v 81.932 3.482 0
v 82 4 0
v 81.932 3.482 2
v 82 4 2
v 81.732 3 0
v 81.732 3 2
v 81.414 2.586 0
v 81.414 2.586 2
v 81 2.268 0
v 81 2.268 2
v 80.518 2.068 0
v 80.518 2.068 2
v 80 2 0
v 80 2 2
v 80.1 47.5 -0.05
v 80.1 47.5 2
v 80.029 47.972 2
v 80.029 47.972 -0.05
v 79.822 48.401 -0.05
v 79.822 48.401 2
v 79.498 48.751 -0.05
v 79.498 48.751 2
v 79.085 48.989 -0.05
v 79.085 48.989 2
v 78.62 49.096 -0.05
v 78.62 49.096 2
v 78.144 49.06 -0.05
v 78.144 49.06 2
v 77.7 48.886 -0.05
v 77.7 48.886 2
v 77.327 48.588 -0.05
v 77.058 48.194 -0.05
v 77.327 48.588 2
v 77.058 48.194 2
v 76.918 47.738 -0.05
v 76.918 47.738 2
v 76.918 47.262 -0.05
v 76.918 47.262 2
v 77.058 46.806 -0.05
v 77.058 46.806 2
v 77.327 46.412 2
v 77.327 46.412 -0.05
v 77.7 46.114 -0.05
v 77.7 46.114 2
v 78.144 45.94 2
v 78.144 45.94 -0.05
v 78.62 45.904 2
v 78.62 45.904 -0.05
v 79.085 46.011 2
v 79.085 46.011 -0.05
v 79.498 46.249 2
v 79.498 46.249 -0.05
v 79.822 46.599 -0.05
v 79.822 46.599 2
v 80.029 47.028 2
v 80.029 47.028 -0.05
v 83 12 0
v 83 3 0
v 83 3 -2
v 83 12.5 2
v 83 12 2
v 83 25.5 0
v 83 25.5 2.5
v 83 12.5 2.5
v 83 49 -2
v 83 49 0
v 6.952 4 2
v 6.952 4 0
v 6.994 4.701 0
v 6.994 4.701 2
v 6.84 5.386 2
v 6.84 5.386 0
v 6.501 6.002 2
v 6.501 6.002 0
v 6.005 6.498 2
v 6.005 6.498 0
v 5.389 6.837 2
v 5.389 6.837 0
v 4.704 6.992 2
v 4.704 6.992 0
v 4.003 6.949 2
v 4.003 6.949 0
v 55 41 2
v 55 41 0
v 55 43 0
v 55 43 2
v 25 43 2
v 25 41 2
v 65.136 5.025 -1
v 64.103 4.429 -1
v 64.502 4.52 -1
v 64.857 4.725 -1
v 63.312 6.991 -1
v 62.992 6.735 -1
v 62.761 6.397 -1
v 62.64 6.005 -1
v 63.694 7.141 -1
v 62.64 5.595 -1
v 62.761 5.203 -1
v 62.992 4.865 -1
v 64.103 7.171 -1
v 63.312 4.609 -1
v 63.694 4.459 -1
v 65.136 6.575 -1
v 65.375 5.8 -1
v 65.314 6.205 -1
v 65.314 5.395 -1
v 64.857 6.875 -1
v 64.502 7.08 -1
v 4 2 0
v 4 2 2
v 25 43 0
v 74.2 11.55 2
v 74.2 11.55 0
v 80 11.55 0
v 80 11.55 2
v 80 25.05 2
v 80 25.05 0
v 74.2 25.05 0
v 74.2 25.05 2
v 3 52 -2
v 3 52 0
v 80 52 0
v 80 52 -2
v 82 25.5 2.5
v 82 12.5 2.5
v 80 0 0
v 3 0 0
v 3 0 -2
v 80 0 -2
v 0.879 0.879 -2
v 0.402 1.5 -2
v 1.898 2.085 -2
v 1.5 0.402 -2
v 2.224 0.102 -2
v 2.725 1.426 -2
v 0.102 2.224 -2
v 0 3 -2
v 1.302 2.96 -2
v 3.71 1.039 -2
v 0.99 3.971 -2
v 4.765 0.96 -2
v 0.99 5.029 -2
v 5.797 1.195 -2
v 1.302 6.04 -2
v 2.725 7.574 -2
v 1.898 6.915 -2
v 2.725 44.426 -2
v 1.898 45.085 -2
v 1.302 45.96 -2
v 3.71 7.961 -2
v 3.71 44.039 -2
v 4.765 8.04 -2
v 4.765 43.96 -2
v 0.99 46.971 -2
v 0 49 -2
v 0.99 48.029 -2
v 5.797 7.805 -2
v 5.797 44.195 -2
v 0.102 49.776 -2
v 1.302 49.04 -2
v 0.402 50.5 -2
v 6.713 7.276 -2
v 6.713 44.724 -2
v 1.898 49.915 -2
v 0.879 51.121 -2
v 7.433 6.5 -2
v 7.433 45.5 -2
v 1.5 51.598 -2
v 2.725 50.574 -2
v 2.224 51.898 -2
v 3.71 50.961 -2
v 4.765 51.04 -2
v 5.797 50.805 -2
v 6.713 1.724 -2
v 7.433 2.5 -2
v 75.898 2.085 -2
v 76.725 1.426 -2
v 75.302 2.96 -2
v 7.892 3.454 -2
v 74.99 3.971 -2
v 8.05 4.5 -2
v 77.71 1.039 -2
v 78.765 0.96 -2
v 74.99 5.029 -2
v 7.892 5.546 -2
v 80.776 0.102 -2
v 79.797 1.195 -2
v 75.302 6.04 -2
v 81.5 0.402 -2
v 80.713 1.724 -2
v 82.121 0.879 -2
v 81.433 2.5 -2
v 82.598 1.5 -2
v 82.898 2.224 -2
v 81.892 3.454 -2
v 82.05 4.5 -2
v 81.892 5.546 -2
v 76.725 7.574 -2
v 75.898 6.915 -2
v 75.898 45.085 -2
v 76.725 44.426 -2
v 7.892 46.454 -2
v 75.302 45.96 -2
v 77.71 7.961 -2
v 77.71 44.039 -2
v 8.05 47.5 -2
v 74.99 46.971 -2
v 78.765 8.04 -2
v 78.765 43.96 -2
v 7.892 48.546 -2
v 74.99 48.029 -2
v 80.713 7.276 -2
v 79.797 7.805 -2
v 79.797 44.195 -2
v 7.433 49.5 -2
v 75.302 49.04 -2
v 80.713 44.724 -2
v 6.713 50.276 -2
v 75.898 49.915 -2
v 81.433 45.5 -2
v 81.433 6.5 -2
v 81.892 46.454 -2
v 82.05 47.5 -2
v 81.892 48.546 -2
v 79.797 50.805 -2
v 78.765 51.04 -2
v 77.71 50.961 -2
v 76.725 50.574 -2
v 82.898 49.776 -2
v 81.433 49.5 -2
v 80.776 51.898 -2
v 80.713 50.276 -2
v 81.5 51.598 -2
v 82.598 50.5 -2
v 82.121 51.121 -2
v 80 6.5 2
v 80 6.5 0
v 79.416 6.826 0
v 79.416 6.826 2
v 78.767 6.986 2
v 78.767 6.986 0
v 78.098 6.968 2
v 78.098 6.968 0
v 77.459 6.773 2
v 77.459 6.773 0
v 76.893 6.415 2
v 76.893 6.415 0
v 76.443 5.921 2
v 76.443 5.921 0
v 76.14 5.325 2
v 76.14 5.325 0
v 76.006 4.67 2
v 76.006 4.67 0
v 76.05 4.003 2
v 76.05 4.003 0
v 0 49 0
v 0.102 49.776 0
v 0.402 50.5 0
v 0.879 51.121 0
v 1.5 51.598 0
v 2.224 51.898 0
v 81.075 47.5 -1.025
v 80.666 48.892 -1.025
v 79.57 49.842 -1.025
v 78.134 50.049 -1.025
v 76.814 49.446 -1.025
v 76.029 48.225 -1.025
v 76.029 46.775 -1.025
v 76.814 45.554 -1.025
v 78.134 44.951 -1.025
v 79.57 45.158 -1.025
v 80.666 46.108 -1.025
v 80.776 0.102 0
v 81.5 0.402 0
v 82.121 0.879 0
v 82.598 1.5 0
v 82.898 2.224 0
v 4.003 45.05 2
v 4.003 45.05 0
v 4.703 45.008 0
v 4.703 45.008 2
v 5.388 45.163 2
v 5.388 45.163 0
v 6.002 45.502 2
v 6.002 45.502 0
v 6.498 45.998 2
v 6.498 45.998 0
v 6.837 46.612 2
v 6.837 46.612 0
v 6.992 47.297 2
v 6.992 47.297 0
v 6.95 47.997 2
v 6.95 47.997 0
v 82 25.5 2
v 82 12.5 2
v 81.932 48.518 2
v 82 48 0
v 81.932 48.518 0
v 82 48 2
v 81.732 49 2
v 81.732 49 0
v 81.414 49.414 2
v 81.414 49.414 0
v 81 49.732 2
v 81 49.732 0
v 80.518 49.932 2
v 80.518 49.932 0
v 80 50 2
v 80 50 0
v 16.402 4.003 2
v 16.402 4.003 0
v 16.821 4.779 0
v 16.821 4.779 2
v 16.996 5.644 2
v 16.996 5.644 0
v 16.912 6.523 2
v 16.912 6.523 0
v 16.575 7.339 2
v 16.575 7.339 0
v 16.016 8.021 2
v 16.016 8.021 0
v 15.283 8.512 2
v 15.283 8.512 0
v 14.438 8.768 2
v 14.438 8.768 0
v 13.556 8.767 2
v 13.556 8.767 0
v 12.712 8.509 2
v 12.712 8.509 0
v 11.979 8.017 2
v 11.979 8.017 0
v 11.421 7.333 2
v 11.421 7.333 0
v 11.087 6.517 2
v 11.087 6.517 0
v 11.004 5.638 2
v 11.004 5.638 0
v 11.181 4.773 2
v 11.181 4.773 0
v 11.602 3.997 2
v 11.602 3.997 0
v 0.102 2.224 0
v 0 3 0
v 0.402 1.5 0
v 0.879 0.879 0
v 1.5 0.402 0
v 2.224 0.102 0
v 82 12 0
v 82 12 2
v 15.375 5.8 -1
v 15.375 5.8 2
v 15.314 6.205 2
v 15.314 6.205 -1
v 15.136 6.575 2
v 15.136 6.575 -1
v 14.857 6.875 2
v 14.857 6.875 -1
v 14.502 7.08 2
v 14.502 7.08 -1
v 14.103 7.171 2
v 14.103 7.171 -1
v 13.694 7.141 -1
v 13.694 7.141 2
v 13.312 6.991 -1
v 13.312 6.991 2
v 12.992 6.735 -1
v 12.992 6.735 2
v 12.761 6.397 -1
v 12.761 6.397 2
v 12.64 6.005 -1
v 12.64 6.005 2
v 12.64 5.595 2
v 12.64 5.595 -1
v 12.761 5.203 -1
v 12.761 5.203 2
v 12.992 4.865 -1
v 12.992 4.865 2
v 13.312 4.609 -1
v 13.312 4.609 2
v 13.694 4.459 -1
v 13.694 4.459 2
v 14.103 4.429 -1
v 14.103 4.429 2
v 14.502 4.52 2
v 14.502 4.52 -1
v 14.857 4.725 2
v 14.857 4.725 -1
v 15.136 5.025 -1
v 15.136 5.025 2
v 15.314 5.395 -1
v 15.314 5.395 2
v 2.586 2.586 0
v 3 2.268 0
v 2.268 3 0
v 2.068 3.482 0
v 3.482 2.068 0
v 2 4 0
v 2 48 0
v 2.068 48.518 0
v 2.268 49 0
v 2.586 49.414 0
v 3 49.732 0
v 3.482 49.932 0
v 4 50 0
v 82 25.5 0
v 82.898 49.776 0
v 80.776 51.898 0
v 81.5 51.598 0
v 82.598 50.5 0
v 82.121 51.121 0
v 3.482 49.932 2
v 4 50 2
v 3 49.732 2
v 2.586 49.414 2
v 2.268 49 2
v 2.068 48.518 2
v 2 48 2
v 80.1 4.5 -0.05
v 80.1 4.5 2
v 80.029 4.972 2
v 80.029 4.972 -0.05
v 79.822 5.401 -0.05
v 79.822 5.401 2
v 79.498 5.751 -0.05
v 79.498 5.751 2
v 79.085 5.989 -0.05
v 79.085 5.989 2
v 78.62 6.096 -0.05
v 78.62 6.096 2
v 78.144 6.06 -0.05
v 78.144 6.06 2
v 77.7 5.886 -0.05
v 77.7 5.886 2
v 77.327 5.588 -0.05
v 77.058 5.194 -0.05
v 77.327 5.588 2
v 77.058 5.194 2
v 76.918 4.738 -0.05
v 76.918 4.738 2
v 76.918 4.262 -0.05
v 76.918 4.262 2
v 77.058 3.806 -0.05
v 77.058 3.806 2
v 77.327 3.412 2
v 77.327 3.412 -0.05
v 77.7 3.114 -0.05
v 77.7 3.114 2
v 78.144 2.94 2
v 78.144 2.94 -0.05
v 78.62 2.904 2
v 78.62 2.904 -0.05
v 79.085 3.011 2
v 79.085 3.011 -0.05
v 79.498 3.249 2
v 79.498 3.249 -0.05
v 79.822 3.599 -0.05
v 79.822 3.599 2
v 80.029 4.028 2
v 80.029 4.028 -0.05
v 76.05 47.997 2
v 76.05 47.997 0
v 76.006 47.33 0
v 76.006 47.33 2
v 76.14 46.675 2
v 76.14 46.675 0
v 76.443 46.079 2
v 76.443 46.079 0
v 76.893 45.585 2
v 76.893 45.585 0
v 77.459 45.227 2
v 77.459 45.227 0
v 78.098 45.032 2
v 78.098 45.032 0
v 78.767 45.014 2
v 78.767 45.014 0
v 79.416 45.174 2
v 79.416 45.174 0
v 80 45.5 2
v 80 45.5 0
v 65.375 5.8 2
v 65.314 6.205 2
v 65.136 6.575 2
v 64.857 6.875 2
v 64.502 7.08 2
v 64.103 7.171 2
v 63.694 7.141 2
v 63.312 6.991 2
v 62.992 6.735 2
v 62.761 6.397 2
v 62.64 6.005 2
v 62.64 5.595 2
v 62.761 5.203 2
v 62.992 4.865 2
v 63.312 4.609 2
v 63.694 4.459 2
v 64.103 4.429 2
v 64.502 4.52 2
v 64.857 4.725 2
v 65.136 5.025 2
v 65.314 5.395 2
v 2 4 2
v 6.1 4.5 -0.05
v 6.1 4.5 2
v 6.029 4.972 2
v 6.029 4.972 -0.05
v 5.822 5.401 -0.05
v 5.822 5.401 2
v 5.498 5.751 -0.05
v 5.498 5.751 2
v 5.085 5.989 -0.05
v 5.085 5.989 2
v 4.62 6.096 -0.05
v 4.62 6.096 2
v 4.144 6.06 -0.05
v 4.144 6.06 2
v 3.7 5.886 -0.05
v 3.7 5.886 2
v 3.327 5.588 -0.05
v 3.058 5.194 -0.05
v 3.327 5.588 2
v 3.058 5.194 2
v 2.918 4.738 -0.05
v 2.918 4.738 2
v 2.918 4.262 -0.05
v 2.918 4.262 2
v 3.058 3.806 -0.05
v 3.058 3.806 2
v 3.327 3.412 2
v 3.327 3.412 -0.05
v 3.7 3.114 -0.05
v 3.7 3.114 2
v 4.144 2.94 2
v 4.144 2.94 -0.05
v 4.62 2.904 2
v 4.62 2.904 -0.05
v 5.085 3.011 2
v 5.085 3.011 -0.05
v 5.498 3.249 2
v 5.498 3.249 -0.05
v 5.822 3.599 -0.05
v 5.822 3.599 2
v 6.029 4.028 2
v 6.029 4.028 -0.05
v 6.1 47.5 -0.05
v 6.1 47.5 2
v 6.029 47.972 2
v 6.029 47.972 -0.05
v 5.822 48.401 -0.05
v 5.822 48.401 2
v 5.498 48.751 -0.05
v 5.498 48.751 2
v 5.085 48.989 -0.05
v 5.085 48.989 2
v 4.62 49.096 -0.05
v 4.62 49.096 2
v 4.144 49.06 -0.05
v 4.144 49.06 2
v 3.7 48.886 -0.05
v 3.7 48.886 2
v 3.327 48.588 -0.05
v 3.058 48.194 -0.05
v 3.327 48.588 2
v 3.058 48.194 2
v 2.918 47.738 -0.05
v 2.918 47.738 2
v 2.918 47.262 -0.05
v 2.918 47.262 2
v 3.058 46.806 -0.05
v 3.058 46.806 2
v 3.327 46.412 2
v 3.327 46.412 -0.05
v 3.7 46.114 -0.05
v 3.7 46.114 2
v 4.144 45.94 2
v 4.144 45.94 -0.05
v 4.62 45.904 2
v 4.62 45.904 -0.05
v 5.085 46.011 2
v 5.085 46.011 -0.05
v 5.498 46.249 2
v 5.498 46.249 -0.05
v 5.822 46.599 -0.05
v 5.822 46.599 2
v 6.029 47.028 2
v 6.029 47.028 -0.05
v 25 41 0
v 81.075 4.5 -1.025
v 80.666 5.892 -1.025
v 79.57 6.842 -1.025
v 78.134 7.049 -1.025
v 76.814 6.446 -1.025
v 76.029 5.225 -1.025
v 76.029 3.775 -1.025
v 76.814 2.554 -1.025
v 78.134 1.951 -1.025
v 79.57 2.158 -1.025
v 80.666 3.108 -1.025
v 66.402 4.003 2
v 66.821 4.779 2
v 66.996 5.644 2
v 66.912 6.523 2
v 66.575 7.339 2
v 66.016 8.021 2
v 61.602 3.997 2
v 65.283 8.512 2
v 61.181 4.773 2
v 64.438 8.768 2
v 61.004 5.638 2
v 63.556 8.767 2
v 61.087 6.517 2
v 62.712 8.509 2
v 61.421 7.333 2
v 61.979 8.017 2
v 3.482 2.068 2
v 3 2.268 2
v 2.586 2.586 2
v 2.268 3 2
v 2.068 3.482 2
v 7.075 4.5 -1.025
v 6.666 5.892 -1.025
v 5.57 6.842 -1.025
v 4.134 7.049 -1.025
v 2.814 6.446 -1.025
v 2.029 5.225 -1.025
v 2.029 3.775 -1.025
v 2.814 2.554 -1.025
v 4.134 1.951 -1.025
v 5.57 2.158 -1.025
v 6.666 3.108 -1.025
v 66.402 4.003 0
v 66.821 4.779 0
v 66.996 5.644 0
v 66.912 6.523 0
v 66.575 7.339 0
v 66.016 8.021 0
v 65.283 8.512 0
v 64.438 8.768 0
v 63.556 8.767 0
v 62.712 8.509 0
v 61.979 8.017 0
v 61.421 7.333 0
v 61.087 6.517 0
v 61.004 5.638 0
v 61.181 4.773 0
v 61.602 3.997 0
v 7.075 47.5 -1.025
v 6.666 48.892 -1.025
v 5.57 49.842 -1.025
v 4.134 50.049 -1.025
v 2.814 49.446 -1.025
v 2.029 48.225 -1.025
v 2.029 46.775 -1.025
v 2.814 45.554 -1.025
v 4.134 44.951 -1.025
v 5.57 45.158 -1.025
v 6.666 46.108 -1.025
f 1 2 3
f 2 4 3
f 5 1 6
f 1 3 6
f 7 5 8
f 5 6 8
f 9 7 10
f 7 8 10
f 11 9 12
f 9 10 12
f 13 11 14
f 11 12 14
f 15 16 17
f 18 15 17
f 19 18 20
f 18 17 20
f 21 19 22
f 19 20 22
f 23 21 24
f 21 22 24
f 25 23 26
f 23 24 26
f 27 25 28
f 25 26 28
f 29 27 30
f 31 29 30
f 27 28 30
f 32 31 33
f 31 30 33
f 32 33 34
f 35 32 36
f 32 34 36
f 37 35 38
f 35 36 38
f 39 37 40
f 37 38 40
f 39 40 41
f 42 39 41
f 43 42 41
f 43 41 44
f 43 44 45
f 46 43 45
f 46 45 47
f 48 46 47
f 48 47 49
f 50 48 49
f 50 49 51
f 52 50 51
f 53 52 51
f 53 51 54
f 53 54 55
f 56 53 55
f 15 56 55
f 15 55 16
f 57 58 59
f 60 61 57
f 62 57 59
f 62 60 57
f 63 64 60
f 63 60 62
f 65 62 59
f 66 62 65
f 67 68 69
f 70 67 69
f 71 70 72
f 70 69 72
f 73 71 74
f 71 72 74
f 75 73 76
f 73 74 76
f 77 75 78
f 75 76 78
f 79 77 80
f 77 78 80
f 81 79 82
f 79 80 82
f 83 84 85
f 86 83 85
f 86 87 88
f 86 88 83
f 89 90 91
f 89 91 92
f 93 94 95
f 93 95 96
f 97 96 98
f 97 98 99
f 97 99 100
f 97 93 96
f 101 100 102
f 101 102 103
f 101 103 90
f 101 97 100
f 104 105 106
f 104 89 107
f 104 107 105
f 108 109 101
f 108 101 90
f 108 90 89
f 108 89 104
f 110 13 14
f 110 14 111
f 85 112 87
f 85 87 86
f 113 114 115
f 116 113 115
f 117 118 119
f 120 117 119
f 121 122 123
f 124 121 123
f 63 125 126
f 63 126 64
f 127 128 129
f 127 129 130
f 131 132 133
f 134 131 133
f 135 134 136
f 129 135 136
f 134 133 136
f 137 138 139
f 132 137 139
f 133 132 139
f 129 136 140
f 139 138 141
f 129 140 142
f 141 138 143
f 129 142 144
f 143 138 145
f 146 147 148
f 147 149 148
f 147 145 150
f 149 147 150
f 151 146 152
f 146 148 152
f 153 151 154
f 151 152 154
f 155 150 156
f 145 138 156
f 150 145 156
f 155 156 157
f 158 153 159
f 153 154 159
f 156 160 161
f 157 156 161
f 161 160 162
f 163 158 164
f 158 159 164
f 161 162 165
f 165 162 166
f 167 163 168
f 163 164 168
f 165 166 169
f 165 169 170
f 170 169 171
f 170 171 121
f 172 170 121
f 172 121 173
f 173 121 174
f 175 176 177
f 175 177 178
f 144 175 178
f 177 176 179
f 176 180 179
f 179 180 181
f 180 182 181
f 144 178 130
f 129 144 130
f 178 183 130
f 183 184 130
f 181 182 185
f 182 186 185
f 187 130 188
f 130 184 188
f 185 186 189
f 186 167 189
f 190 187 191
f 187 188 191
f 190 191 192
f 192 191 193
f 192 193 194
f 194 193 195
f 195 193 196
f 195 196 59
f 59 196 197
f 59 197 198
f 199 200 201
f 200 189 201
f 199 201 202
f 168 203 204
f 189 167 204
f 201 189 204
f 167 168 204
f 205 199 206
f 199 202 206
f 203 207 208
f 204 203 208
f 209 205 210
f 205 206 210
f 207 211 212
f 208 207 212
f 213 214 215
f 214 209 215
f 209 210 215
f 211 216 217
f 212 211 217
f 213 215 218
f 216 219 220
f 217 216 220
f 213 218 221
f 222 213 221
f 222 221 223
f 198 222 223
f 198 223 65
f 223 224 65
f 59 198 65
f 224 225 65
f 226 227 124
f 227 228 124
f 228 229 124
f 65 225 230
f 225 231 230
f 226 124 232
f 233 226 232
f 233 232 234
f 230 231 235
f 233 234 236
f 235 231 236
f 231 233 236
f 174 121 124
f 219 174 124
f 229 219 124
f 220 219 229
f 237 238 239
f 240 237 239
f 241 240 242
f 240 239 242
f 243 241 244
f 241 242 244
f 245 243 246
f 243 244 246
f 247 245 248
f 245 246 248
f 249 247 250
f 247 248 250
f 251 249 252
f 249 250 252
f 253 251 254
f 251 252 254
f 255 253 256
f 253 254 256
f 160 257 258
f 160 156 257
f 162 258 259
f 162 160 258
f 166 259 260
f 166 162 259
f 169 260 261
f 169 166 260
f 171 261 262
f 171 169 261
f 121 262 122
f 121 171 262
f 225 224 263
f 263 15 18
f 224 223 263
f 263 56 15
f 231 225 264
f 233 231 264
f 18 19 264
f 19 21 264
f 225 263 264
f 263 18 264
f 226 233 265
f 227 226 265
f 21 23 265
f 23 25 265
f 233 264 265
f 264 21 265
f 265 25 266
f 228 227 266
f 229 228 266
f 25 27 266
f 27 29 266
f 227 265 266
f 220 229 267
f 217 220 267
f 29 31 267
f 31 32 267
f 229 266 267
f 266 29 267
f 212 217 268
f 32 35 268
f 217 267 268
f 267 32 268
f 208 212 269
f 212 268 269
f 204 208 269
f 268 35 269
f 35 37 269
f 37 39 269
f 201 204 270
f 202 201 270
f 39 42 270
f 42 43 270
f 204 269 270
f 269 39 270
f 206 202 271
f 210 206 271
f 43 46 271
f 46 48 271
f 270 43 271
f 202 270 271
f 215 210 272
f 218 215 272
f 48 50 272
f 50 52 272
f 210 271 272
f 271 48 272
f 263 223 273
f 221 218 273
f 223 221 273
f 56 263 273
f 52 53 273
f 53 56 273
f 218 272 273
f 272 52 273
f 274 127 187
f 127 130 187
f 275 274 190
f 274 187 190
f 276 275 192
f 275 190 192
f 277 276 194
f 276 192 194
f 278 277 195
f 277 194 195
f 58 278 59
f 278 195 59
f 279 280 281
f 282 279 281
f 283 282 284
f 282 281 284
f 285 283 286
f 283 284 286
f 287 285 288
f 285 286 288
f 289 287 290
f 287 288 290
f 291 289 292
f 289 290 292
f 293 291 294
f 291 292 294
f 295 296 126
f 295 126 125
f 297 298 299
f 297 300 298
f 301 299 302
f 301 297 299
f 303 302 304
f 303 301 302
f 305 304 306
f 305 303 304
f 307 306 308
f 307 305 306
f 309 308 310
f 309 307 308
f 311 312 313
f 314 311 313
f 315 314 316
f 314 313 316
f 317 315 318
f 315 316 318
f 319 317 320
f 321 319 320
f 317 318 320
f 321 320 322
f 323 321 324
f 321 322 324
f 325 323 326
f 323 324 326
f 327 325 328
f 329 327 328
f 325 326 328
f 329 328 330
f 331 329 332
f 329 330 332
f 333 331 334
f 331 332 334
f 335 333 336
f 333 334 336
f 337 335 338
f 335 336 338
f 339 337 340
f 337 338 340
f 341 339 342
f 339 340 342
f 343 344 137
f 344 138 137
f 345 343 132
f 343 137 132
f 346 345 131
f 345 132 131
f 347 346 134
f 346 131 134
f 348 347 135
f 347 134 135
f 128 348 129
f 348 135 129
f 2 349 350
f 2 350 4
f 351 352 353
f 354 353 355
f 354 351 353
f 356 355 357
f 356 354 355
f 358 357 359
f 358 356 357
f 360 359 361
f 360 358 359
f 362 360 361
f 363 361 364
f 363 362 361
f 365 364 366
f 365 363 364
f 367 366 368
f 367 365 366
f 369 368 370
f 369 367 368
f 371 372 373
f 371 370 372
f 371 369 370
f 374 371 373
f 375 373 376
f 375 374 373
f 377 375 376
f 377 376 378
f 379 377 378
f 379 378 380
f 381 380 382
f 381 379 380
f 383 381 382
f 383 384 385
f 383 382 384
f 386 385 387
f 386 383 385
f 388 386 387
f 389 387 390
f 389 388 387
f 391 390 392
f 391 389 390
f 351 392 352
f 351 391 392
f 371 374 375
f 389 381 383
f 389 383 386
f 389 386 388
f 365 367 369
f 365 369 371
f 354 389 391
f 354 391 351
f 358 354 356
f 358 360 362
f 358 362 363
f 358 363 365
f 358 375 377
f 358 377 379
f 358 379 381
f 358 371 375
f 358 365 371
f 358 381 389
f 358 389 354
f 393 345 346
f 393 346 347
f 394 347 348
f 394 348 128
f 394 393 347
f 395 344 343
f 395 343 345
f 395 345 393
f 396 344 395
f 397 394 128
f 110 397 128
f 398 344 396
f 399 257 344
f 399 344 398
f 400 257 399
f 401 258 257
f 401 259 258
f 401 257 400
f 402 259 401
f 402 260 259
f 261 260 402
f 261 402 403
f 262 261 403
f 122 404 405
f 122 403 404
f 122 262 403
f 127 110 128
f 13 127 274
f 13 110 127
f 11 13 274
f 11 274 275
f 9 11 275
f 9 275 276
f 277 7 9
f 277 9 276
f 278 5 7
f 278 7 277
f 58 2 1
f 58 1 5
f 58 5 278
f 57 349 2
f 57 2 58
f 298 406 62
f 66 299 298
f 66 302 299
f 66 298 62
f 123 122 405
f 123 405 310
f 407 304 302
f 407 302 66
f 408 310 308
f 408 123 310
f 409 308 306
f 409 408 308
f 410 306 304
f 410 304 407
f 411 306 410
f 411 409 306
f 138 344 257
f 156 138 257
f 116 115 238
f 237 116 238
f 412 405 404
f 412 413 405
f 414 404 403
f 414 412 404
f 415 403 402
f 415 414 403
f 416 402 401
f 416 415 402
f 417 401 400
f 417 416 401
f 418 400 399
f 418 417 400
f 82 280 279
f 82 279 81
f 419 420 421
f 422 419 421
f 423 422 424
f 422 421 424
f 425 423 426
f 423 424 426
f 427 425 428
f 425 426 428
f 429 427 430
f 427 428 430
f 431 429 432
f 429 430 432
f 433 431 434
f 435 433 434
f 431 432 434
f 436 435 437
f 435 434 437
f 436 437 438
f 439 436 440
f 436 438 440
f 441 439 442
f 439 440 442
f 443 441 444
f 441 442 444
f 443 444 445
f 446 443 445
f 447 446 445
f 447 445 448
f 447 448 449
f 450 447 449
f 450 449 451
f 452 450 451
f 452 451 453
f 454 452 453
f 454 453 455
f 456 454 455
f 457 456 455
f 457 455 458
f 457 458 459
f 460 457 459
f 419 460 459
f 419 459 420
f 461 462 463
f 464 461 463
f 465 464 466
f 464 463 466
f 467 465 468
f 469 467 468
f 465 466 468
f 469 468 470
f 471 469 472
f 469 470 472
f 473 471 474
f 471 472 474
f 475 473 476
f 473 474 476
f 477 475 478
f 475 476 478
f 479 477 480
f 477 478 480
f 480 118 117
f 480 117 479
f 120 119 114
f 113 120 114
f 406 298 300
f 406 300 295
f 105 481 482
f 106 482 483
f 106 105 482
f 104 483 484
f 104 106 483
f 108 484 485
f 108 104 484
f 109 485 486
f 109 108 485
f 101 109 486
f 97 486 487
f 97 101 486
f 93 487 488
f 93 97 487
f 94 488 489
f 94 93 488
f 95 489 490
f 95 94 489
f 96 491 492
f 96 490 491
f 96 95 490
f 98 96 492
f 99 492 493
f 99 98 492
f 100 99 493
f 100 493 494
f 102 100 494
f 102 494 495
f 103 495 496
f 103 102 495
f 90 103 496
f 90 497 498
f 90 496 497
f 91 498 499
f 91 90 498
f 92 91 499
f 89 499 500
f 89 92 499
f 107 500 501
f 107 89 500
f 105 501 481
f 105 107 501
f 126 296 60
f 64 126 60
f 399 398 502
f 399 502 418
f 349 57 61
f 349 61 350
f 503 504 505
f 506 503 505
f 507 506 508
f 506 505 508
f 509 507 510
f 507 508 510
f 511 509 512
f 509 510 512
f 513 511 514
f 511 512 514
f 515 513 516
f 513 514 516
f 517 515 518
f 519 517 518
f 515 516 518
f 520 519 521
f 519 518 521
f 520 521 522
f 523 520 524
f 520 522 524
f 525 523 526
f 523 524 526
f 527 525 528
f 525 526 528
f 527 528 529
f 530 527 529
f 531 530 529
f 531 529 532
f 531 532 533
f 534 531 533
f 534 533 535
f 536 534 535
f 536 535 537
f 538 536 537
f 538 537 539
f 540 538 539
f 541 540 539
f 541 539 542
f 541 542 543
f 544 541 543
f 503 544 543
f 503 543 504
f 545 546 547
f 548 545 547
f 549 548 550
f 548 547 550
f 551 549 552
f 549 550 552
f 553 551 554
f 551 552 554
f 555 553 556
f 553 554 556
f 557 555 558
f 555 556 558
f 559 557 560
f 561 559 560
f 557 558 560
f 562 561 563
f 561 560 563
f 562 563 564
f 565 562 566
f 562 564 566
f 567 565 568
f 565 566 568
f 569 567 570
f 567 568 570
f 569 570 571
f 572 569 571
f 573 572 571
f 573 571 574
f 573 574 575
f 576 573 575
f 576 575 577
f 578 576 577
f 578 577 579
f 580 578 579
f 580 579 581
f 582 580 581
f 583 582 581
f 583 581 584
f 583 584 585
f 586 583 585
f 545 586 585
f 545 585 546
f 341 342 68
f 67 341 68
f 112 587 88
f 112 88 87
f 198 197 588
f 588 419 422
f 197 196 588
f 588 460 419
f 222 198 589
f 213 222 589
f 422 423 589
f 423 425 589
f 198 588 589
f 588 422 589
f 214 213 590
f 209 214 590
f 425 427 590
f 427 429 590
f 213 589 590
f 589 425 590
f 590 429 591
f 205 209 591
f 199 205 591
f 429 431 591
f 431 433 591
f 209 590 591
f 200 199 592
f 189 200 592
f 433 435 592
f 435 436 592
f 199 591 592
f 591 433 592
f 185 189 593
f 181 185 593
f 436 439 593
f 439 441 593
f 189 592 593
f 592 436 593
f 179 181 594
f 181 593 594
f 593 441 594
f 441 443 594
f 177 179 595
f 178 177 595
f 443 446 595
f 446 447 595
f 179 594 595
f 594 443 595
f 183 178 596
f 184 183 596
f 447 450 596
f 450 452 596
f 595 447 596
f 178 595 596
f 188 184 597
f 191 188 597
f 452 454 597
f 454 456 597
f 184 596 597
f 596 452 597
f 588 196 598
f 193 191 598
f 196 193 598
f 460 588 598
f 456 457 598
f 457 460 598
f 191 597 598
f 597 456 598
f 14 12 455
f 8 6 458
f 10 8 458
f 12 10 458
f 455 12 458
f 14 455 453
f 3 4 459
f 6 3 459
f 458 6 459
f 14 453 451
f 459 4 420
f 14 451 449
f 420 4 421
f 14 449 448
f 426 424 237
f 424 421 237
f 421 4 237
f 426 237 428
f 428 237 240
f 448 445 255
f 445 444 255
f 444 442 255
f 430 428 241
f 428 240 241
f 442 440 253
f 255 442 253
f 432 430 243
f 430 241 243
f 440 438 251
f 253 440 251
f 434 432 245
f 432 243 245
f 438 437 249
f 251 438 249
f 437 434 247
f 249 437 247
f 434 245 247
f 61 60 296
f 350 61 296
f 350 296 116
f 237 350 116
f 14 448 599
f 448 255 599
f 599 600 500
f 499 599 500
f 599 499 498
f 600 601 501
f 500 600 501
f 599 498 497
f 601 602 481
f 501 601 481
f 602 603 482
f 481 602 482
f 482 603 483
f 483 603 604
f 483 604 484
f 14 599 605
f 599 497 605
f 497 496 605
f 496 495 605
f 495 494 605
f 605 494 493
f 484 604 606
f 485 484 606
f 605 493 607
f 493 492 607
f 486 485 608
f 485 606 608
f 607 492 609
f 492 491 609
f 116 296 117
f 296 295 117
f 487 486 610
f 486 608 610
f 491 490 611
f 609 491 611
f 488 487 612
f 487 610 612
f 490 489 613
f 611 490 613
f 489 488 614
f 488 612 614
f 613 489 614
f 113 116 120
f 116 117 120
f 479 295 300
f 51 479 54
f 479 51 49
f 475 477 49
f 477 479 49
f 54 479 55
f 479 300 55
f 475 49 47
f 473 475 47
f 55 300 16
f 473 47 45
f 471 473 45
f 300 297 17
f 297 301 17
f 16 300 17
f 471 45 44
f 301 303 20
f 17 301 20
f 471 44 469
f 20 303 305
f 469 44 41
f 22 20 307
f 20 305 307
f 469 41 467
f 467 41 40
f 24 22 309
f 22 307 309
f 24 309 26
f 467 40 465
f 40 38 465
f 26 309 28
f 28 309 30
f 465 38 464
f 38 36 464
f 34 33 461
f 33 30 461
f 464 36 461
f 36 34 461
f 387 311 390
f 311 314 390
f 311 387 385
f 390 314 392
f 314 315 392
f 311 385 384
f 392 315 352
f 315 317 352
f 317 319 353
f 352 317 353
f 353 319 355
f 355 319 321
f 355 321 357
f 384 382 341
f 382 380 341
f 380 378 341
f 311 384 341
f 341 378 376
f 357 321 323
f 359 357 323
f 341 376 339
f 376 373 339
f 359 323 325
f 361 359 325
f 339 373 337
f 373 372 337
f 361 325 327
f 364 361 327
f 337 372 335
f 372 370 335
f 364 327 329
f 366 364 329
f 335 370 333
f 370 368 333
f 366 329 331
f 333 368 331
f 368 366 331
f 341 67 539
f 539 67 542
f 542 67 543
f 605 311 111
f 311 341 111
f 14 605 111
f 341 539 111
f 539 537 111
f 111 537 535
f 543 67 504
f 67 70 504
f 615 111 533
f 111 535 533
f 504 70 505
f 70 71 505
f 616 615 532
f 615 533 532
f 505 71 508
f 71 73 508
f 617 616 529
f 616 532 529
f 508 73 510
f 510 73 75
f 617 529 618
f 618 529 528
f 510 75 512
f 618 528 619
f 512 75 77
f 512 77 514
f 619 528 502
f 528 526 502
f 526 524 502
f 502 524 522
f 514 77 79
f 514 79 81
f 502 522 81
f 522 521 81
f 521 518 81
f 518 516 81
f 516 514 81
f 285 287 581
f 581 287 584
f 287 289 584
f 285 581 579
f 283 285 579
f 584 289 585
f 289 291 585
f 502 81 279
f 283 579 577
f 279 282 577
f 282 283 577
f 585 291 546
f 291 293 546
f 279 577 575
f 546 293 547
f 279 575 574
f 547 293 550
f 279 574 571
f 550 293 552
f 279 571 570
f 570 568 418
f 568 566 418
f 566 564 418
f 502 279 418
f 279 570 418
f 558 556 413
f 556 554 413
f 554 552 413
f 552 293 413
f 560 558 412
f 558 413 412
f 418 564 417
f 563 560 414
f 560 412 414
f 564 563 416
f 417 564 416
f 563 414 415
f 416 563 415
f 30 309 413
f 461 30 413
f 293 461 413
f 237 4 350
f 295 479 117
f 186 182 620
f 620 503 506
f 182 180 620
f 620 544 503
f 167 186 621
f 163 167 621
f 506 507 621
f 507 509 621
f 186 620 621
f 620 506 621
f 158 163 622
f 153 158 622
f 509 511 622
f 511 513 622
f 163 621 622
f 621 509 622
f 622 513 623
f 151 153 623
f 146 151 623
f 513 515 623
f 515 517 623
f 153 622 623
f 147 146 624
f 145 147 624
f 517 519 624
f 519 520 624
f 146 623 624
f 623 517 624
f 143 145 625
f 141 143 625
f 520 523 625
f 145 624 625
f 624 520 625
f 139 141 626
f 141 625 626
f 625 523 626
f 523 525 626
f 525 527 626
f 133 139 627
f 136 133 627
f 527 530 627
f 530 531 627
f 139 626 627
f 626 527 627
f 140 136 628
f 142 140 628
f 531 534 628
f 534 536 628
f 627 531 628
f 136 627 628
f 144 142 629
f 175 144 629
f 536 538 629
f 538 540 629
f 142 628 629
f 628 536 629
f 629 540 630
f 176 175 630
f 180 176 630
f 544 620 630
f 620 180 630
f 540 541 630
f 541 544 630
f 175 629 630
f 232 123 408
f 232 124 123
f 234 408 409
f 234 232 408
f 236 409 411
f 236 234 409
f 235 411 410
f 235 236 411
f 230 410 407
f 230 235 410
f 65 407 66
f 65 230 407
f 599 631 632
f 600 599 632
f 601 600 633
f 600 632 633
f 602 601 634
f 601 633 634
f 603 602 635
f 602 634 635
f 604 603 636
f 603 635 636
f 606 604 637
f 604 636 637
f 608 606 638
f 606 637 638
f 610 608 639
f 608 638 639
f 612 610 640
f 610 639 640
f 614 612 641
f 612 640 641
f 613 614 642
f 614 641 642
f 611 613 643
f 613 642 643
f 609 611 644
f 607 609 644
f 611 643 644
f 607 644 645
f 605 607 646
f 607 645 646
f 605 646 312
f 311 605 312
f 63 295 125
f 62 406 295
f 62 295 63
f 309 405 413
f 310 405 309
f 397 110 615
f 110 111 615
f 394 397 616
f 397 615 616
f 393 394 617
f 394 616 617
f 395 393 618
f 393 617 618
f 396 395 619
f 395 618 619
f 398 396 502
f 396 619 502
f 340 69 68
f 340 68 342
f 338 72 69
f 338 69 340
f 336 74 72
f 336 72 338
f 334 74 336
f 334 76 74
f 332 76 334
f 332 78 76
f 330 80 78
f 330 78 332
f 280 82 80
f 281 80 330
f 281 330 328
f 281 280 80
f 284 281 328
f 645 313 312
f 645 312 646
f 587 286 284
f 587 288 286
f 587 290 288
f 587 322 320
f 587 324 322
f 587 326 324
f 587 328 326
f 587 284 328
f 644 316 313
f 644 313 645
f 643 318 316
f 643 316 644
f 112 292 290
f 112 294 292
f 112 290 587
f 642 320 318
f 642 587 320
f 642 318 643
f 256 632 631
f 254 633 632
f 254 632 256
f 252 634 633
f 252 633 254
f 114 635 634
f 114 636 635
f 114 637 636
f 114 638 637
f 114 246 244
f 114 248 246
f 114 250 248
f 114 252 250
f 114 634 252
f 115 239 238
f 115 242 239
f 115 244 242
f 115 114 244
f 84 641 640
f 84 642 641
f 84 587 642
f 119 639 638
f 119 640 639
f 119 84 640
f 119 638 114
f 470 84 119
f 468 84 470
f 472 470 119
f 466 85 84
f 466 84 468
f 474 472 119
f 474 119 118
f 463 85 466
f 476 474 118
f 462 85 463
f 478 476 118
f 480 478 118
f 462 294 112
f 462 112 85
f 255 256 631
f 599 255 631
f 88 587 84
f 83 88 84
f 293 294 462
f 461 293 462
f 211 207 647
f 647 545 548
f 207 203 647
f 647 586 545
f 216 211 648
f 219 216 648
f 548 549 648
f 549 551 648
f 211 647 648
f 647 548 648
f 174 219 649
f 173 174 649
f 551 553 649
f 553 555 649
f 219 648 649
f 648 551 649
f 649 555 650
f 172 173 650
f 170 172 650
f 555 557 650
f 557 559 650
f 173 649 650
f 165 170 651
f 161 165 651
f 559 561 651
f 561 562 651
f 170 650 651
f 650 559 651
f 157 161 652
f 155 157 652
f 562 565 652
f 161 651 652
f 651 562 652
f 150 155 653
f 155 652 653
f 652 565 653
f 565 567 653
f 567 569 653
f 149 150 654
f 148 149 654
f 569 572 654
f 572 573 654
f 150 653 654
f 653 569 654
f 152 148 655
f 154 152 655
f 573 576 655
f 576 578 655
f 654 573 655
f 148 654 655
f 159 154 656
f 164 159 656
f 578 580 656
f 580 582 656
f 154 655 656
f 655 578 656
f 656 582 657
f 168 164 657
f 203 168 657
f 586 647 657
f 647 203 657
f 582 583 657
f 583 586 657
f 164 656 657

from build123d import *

# Parameters (mm, degrees)
SKETCH_W             = 83
SKETCH_H             = 52
PAD_DEPTH            = 2
SKETCH001_W          = 30
SKETCH001_H          = 2
PAD001_DEPTH         = 2
SKETCH005_R          = 1.6
POCKET_DEPTH         = 5
POCKET_DEPTH_BACK    = -5
SKETCH003_R          = 1.375
POCKET001_DEPTH      = 2
POCKET001_DEPTH_BACK = 1.5
SKETCH004_W          = 1
SKETCH004_H          = 13
PAD002_DEPTH         = 2.5
CHAMFER_SIZE         = 1.95
FILLET_R             = 3
FILLET001_R          = 2


with BuildPart() as part:
    # Sketch → Pad (new body)
    with BuildSketch(Plane.XY):
        with Locations((41.5, 26)):
            Rectangle(SKETCH_W, SKETCH_H)
    extrude(amount=-PAD_DEPTH)

    # Sketch001 → Pad001 (join)
    with BuildSketch(Plane.XY):
        Polygon((2, 2), (2, 50), (82, 50), (82, 25.5), (83, 25.5), (83, 12), (82, 12), (82, 2), align=None)
        with BuildLine():
            Line((6.95, 47.997494), (76.05, 47.997494))
            ThreePointArc((76.05, 47.997494), (77.163963, 45.386944), (80, 45.5))
            Line((80, 25.05), (80, 45.5))
            Line((80, 25.05), (74.2, 25.05))
            Line((74.2, 25.05), (74.2, 11.55))
            Line((74.2, 11.55), (80, 11.55))
            Line((80, 11.55), (80, 6.5))
            ThreePointArc((80, 6.5), (77.163963, 6.613056), (76.05, 4.002506))
            Line((76.05, 4.002506), (66.401878, 4.002506))
            ThreePointArc((66.401878, 4.002506), (63.996871, 8.799998), (61.601878, 3.997499))
            Line((61.601878, 3.997499), (16.401878, 4.002506))
            ThreePointArc((16.401878, 4.002506), (13.996871, 8.799998), (11.601878, 3.997499))
            Line((11.601878, 3.997499), (6.951878, 3.9995))
            ThreePointArc((6.951878, 3.9995), (6.270443, 6.267581), (4.002506, 6.949493))
            Line((4.002506, 45.05), (4.002506, 6.949493))
            ThreePointArc((4.002506, 45.05), (6.267767, 45.732233), (6.95, 47.997494))
        make_face(mode=Mode.SUBTRACT)
        with Locations((40, 42)):
            Rectangle(SKETCH001_W, SKETCH001_H)
    extrude(amount=PAD001_DEPTH)

    # Sketch005 → Pocket (cut, two sides)
    with BuildSketch(Plane.XY) as pocket_sk:
        with Locations((4.5, 47.5)):
            Circle(SKETCH005_R)
        with Locations((78.5, 47.5)):
            Circle(SKETCH005_R)
        with Locations((78.5, 4.5)):
            Circle(SKETCH005_R)
        with Locations((4.5, 4.5)):
            Circle(SKETCH005_R)
    extrude(amount=-POCKET_DEPTH, mode=Mode.SUBTRACT)
    extrude(pocket_sk.sketch, amount=-POCKET_DEPTH_BACK, mode=Mode.SUBTRACT)

    # Sketch003 → Pocket001 (cut, two sides)
    with BuildSketch(Plane.XY.offset(0.5)) as pocket001_sk:
        with Locations((14, 5.8)):
            Circle(SKETCH003_R)
        with Locations((64, 5.8)):
            Circle(SKETCH003_R)
    extrude(amount=POCKET001_DEPTH, mode=Mode.SUBTRACT)
    extrude(pocket001_sk.sketch, amount=-POCKET001_DEPTH_BACK, mode=Mode.SUBTRACT)

    # Sketch004 → Pad002 (join)
    with BuildSketch(Plane.XY):
        with Locations((82.5, 19)):
            Rectangle(SKETCH004_W, SKETCH004_H)
    extrude(amount=PAD002_DEPTH)

    # Chamfer
    chamfer_edges = [part.edges().sort_by_distance(p)[0] for p in [
        (2.9, 47.5, -2),
        (2.9, 4.5, -2),
        (76.9, 4.5, -2),
        (76.9, 47.5, -2),
    ]]
    chamfer(chamfer_edges, length=CHAMFER_SIZE)

    # Fillet
    fillet_edges = [part.edges().sort_by_distance(p)[0] for p in [
        (83, 52, -1),
        (0, 52, -1),
        (0, 0, -1),
        (83, 0, -1),
    ]]
    fillet(fillet_edges, radius=FILLET_R)

    # Fillet001
    fillet001_edges = [part.edges().sort_by_distance(p)[0] for p in [
        (82, 2, 1),
        (2, 2, 1),
        (82, 50, 1),
        (2, 50, 1),
    ]]
    fillet(fillet001_edges, radius=FILLET001_R)


solid = part.part
